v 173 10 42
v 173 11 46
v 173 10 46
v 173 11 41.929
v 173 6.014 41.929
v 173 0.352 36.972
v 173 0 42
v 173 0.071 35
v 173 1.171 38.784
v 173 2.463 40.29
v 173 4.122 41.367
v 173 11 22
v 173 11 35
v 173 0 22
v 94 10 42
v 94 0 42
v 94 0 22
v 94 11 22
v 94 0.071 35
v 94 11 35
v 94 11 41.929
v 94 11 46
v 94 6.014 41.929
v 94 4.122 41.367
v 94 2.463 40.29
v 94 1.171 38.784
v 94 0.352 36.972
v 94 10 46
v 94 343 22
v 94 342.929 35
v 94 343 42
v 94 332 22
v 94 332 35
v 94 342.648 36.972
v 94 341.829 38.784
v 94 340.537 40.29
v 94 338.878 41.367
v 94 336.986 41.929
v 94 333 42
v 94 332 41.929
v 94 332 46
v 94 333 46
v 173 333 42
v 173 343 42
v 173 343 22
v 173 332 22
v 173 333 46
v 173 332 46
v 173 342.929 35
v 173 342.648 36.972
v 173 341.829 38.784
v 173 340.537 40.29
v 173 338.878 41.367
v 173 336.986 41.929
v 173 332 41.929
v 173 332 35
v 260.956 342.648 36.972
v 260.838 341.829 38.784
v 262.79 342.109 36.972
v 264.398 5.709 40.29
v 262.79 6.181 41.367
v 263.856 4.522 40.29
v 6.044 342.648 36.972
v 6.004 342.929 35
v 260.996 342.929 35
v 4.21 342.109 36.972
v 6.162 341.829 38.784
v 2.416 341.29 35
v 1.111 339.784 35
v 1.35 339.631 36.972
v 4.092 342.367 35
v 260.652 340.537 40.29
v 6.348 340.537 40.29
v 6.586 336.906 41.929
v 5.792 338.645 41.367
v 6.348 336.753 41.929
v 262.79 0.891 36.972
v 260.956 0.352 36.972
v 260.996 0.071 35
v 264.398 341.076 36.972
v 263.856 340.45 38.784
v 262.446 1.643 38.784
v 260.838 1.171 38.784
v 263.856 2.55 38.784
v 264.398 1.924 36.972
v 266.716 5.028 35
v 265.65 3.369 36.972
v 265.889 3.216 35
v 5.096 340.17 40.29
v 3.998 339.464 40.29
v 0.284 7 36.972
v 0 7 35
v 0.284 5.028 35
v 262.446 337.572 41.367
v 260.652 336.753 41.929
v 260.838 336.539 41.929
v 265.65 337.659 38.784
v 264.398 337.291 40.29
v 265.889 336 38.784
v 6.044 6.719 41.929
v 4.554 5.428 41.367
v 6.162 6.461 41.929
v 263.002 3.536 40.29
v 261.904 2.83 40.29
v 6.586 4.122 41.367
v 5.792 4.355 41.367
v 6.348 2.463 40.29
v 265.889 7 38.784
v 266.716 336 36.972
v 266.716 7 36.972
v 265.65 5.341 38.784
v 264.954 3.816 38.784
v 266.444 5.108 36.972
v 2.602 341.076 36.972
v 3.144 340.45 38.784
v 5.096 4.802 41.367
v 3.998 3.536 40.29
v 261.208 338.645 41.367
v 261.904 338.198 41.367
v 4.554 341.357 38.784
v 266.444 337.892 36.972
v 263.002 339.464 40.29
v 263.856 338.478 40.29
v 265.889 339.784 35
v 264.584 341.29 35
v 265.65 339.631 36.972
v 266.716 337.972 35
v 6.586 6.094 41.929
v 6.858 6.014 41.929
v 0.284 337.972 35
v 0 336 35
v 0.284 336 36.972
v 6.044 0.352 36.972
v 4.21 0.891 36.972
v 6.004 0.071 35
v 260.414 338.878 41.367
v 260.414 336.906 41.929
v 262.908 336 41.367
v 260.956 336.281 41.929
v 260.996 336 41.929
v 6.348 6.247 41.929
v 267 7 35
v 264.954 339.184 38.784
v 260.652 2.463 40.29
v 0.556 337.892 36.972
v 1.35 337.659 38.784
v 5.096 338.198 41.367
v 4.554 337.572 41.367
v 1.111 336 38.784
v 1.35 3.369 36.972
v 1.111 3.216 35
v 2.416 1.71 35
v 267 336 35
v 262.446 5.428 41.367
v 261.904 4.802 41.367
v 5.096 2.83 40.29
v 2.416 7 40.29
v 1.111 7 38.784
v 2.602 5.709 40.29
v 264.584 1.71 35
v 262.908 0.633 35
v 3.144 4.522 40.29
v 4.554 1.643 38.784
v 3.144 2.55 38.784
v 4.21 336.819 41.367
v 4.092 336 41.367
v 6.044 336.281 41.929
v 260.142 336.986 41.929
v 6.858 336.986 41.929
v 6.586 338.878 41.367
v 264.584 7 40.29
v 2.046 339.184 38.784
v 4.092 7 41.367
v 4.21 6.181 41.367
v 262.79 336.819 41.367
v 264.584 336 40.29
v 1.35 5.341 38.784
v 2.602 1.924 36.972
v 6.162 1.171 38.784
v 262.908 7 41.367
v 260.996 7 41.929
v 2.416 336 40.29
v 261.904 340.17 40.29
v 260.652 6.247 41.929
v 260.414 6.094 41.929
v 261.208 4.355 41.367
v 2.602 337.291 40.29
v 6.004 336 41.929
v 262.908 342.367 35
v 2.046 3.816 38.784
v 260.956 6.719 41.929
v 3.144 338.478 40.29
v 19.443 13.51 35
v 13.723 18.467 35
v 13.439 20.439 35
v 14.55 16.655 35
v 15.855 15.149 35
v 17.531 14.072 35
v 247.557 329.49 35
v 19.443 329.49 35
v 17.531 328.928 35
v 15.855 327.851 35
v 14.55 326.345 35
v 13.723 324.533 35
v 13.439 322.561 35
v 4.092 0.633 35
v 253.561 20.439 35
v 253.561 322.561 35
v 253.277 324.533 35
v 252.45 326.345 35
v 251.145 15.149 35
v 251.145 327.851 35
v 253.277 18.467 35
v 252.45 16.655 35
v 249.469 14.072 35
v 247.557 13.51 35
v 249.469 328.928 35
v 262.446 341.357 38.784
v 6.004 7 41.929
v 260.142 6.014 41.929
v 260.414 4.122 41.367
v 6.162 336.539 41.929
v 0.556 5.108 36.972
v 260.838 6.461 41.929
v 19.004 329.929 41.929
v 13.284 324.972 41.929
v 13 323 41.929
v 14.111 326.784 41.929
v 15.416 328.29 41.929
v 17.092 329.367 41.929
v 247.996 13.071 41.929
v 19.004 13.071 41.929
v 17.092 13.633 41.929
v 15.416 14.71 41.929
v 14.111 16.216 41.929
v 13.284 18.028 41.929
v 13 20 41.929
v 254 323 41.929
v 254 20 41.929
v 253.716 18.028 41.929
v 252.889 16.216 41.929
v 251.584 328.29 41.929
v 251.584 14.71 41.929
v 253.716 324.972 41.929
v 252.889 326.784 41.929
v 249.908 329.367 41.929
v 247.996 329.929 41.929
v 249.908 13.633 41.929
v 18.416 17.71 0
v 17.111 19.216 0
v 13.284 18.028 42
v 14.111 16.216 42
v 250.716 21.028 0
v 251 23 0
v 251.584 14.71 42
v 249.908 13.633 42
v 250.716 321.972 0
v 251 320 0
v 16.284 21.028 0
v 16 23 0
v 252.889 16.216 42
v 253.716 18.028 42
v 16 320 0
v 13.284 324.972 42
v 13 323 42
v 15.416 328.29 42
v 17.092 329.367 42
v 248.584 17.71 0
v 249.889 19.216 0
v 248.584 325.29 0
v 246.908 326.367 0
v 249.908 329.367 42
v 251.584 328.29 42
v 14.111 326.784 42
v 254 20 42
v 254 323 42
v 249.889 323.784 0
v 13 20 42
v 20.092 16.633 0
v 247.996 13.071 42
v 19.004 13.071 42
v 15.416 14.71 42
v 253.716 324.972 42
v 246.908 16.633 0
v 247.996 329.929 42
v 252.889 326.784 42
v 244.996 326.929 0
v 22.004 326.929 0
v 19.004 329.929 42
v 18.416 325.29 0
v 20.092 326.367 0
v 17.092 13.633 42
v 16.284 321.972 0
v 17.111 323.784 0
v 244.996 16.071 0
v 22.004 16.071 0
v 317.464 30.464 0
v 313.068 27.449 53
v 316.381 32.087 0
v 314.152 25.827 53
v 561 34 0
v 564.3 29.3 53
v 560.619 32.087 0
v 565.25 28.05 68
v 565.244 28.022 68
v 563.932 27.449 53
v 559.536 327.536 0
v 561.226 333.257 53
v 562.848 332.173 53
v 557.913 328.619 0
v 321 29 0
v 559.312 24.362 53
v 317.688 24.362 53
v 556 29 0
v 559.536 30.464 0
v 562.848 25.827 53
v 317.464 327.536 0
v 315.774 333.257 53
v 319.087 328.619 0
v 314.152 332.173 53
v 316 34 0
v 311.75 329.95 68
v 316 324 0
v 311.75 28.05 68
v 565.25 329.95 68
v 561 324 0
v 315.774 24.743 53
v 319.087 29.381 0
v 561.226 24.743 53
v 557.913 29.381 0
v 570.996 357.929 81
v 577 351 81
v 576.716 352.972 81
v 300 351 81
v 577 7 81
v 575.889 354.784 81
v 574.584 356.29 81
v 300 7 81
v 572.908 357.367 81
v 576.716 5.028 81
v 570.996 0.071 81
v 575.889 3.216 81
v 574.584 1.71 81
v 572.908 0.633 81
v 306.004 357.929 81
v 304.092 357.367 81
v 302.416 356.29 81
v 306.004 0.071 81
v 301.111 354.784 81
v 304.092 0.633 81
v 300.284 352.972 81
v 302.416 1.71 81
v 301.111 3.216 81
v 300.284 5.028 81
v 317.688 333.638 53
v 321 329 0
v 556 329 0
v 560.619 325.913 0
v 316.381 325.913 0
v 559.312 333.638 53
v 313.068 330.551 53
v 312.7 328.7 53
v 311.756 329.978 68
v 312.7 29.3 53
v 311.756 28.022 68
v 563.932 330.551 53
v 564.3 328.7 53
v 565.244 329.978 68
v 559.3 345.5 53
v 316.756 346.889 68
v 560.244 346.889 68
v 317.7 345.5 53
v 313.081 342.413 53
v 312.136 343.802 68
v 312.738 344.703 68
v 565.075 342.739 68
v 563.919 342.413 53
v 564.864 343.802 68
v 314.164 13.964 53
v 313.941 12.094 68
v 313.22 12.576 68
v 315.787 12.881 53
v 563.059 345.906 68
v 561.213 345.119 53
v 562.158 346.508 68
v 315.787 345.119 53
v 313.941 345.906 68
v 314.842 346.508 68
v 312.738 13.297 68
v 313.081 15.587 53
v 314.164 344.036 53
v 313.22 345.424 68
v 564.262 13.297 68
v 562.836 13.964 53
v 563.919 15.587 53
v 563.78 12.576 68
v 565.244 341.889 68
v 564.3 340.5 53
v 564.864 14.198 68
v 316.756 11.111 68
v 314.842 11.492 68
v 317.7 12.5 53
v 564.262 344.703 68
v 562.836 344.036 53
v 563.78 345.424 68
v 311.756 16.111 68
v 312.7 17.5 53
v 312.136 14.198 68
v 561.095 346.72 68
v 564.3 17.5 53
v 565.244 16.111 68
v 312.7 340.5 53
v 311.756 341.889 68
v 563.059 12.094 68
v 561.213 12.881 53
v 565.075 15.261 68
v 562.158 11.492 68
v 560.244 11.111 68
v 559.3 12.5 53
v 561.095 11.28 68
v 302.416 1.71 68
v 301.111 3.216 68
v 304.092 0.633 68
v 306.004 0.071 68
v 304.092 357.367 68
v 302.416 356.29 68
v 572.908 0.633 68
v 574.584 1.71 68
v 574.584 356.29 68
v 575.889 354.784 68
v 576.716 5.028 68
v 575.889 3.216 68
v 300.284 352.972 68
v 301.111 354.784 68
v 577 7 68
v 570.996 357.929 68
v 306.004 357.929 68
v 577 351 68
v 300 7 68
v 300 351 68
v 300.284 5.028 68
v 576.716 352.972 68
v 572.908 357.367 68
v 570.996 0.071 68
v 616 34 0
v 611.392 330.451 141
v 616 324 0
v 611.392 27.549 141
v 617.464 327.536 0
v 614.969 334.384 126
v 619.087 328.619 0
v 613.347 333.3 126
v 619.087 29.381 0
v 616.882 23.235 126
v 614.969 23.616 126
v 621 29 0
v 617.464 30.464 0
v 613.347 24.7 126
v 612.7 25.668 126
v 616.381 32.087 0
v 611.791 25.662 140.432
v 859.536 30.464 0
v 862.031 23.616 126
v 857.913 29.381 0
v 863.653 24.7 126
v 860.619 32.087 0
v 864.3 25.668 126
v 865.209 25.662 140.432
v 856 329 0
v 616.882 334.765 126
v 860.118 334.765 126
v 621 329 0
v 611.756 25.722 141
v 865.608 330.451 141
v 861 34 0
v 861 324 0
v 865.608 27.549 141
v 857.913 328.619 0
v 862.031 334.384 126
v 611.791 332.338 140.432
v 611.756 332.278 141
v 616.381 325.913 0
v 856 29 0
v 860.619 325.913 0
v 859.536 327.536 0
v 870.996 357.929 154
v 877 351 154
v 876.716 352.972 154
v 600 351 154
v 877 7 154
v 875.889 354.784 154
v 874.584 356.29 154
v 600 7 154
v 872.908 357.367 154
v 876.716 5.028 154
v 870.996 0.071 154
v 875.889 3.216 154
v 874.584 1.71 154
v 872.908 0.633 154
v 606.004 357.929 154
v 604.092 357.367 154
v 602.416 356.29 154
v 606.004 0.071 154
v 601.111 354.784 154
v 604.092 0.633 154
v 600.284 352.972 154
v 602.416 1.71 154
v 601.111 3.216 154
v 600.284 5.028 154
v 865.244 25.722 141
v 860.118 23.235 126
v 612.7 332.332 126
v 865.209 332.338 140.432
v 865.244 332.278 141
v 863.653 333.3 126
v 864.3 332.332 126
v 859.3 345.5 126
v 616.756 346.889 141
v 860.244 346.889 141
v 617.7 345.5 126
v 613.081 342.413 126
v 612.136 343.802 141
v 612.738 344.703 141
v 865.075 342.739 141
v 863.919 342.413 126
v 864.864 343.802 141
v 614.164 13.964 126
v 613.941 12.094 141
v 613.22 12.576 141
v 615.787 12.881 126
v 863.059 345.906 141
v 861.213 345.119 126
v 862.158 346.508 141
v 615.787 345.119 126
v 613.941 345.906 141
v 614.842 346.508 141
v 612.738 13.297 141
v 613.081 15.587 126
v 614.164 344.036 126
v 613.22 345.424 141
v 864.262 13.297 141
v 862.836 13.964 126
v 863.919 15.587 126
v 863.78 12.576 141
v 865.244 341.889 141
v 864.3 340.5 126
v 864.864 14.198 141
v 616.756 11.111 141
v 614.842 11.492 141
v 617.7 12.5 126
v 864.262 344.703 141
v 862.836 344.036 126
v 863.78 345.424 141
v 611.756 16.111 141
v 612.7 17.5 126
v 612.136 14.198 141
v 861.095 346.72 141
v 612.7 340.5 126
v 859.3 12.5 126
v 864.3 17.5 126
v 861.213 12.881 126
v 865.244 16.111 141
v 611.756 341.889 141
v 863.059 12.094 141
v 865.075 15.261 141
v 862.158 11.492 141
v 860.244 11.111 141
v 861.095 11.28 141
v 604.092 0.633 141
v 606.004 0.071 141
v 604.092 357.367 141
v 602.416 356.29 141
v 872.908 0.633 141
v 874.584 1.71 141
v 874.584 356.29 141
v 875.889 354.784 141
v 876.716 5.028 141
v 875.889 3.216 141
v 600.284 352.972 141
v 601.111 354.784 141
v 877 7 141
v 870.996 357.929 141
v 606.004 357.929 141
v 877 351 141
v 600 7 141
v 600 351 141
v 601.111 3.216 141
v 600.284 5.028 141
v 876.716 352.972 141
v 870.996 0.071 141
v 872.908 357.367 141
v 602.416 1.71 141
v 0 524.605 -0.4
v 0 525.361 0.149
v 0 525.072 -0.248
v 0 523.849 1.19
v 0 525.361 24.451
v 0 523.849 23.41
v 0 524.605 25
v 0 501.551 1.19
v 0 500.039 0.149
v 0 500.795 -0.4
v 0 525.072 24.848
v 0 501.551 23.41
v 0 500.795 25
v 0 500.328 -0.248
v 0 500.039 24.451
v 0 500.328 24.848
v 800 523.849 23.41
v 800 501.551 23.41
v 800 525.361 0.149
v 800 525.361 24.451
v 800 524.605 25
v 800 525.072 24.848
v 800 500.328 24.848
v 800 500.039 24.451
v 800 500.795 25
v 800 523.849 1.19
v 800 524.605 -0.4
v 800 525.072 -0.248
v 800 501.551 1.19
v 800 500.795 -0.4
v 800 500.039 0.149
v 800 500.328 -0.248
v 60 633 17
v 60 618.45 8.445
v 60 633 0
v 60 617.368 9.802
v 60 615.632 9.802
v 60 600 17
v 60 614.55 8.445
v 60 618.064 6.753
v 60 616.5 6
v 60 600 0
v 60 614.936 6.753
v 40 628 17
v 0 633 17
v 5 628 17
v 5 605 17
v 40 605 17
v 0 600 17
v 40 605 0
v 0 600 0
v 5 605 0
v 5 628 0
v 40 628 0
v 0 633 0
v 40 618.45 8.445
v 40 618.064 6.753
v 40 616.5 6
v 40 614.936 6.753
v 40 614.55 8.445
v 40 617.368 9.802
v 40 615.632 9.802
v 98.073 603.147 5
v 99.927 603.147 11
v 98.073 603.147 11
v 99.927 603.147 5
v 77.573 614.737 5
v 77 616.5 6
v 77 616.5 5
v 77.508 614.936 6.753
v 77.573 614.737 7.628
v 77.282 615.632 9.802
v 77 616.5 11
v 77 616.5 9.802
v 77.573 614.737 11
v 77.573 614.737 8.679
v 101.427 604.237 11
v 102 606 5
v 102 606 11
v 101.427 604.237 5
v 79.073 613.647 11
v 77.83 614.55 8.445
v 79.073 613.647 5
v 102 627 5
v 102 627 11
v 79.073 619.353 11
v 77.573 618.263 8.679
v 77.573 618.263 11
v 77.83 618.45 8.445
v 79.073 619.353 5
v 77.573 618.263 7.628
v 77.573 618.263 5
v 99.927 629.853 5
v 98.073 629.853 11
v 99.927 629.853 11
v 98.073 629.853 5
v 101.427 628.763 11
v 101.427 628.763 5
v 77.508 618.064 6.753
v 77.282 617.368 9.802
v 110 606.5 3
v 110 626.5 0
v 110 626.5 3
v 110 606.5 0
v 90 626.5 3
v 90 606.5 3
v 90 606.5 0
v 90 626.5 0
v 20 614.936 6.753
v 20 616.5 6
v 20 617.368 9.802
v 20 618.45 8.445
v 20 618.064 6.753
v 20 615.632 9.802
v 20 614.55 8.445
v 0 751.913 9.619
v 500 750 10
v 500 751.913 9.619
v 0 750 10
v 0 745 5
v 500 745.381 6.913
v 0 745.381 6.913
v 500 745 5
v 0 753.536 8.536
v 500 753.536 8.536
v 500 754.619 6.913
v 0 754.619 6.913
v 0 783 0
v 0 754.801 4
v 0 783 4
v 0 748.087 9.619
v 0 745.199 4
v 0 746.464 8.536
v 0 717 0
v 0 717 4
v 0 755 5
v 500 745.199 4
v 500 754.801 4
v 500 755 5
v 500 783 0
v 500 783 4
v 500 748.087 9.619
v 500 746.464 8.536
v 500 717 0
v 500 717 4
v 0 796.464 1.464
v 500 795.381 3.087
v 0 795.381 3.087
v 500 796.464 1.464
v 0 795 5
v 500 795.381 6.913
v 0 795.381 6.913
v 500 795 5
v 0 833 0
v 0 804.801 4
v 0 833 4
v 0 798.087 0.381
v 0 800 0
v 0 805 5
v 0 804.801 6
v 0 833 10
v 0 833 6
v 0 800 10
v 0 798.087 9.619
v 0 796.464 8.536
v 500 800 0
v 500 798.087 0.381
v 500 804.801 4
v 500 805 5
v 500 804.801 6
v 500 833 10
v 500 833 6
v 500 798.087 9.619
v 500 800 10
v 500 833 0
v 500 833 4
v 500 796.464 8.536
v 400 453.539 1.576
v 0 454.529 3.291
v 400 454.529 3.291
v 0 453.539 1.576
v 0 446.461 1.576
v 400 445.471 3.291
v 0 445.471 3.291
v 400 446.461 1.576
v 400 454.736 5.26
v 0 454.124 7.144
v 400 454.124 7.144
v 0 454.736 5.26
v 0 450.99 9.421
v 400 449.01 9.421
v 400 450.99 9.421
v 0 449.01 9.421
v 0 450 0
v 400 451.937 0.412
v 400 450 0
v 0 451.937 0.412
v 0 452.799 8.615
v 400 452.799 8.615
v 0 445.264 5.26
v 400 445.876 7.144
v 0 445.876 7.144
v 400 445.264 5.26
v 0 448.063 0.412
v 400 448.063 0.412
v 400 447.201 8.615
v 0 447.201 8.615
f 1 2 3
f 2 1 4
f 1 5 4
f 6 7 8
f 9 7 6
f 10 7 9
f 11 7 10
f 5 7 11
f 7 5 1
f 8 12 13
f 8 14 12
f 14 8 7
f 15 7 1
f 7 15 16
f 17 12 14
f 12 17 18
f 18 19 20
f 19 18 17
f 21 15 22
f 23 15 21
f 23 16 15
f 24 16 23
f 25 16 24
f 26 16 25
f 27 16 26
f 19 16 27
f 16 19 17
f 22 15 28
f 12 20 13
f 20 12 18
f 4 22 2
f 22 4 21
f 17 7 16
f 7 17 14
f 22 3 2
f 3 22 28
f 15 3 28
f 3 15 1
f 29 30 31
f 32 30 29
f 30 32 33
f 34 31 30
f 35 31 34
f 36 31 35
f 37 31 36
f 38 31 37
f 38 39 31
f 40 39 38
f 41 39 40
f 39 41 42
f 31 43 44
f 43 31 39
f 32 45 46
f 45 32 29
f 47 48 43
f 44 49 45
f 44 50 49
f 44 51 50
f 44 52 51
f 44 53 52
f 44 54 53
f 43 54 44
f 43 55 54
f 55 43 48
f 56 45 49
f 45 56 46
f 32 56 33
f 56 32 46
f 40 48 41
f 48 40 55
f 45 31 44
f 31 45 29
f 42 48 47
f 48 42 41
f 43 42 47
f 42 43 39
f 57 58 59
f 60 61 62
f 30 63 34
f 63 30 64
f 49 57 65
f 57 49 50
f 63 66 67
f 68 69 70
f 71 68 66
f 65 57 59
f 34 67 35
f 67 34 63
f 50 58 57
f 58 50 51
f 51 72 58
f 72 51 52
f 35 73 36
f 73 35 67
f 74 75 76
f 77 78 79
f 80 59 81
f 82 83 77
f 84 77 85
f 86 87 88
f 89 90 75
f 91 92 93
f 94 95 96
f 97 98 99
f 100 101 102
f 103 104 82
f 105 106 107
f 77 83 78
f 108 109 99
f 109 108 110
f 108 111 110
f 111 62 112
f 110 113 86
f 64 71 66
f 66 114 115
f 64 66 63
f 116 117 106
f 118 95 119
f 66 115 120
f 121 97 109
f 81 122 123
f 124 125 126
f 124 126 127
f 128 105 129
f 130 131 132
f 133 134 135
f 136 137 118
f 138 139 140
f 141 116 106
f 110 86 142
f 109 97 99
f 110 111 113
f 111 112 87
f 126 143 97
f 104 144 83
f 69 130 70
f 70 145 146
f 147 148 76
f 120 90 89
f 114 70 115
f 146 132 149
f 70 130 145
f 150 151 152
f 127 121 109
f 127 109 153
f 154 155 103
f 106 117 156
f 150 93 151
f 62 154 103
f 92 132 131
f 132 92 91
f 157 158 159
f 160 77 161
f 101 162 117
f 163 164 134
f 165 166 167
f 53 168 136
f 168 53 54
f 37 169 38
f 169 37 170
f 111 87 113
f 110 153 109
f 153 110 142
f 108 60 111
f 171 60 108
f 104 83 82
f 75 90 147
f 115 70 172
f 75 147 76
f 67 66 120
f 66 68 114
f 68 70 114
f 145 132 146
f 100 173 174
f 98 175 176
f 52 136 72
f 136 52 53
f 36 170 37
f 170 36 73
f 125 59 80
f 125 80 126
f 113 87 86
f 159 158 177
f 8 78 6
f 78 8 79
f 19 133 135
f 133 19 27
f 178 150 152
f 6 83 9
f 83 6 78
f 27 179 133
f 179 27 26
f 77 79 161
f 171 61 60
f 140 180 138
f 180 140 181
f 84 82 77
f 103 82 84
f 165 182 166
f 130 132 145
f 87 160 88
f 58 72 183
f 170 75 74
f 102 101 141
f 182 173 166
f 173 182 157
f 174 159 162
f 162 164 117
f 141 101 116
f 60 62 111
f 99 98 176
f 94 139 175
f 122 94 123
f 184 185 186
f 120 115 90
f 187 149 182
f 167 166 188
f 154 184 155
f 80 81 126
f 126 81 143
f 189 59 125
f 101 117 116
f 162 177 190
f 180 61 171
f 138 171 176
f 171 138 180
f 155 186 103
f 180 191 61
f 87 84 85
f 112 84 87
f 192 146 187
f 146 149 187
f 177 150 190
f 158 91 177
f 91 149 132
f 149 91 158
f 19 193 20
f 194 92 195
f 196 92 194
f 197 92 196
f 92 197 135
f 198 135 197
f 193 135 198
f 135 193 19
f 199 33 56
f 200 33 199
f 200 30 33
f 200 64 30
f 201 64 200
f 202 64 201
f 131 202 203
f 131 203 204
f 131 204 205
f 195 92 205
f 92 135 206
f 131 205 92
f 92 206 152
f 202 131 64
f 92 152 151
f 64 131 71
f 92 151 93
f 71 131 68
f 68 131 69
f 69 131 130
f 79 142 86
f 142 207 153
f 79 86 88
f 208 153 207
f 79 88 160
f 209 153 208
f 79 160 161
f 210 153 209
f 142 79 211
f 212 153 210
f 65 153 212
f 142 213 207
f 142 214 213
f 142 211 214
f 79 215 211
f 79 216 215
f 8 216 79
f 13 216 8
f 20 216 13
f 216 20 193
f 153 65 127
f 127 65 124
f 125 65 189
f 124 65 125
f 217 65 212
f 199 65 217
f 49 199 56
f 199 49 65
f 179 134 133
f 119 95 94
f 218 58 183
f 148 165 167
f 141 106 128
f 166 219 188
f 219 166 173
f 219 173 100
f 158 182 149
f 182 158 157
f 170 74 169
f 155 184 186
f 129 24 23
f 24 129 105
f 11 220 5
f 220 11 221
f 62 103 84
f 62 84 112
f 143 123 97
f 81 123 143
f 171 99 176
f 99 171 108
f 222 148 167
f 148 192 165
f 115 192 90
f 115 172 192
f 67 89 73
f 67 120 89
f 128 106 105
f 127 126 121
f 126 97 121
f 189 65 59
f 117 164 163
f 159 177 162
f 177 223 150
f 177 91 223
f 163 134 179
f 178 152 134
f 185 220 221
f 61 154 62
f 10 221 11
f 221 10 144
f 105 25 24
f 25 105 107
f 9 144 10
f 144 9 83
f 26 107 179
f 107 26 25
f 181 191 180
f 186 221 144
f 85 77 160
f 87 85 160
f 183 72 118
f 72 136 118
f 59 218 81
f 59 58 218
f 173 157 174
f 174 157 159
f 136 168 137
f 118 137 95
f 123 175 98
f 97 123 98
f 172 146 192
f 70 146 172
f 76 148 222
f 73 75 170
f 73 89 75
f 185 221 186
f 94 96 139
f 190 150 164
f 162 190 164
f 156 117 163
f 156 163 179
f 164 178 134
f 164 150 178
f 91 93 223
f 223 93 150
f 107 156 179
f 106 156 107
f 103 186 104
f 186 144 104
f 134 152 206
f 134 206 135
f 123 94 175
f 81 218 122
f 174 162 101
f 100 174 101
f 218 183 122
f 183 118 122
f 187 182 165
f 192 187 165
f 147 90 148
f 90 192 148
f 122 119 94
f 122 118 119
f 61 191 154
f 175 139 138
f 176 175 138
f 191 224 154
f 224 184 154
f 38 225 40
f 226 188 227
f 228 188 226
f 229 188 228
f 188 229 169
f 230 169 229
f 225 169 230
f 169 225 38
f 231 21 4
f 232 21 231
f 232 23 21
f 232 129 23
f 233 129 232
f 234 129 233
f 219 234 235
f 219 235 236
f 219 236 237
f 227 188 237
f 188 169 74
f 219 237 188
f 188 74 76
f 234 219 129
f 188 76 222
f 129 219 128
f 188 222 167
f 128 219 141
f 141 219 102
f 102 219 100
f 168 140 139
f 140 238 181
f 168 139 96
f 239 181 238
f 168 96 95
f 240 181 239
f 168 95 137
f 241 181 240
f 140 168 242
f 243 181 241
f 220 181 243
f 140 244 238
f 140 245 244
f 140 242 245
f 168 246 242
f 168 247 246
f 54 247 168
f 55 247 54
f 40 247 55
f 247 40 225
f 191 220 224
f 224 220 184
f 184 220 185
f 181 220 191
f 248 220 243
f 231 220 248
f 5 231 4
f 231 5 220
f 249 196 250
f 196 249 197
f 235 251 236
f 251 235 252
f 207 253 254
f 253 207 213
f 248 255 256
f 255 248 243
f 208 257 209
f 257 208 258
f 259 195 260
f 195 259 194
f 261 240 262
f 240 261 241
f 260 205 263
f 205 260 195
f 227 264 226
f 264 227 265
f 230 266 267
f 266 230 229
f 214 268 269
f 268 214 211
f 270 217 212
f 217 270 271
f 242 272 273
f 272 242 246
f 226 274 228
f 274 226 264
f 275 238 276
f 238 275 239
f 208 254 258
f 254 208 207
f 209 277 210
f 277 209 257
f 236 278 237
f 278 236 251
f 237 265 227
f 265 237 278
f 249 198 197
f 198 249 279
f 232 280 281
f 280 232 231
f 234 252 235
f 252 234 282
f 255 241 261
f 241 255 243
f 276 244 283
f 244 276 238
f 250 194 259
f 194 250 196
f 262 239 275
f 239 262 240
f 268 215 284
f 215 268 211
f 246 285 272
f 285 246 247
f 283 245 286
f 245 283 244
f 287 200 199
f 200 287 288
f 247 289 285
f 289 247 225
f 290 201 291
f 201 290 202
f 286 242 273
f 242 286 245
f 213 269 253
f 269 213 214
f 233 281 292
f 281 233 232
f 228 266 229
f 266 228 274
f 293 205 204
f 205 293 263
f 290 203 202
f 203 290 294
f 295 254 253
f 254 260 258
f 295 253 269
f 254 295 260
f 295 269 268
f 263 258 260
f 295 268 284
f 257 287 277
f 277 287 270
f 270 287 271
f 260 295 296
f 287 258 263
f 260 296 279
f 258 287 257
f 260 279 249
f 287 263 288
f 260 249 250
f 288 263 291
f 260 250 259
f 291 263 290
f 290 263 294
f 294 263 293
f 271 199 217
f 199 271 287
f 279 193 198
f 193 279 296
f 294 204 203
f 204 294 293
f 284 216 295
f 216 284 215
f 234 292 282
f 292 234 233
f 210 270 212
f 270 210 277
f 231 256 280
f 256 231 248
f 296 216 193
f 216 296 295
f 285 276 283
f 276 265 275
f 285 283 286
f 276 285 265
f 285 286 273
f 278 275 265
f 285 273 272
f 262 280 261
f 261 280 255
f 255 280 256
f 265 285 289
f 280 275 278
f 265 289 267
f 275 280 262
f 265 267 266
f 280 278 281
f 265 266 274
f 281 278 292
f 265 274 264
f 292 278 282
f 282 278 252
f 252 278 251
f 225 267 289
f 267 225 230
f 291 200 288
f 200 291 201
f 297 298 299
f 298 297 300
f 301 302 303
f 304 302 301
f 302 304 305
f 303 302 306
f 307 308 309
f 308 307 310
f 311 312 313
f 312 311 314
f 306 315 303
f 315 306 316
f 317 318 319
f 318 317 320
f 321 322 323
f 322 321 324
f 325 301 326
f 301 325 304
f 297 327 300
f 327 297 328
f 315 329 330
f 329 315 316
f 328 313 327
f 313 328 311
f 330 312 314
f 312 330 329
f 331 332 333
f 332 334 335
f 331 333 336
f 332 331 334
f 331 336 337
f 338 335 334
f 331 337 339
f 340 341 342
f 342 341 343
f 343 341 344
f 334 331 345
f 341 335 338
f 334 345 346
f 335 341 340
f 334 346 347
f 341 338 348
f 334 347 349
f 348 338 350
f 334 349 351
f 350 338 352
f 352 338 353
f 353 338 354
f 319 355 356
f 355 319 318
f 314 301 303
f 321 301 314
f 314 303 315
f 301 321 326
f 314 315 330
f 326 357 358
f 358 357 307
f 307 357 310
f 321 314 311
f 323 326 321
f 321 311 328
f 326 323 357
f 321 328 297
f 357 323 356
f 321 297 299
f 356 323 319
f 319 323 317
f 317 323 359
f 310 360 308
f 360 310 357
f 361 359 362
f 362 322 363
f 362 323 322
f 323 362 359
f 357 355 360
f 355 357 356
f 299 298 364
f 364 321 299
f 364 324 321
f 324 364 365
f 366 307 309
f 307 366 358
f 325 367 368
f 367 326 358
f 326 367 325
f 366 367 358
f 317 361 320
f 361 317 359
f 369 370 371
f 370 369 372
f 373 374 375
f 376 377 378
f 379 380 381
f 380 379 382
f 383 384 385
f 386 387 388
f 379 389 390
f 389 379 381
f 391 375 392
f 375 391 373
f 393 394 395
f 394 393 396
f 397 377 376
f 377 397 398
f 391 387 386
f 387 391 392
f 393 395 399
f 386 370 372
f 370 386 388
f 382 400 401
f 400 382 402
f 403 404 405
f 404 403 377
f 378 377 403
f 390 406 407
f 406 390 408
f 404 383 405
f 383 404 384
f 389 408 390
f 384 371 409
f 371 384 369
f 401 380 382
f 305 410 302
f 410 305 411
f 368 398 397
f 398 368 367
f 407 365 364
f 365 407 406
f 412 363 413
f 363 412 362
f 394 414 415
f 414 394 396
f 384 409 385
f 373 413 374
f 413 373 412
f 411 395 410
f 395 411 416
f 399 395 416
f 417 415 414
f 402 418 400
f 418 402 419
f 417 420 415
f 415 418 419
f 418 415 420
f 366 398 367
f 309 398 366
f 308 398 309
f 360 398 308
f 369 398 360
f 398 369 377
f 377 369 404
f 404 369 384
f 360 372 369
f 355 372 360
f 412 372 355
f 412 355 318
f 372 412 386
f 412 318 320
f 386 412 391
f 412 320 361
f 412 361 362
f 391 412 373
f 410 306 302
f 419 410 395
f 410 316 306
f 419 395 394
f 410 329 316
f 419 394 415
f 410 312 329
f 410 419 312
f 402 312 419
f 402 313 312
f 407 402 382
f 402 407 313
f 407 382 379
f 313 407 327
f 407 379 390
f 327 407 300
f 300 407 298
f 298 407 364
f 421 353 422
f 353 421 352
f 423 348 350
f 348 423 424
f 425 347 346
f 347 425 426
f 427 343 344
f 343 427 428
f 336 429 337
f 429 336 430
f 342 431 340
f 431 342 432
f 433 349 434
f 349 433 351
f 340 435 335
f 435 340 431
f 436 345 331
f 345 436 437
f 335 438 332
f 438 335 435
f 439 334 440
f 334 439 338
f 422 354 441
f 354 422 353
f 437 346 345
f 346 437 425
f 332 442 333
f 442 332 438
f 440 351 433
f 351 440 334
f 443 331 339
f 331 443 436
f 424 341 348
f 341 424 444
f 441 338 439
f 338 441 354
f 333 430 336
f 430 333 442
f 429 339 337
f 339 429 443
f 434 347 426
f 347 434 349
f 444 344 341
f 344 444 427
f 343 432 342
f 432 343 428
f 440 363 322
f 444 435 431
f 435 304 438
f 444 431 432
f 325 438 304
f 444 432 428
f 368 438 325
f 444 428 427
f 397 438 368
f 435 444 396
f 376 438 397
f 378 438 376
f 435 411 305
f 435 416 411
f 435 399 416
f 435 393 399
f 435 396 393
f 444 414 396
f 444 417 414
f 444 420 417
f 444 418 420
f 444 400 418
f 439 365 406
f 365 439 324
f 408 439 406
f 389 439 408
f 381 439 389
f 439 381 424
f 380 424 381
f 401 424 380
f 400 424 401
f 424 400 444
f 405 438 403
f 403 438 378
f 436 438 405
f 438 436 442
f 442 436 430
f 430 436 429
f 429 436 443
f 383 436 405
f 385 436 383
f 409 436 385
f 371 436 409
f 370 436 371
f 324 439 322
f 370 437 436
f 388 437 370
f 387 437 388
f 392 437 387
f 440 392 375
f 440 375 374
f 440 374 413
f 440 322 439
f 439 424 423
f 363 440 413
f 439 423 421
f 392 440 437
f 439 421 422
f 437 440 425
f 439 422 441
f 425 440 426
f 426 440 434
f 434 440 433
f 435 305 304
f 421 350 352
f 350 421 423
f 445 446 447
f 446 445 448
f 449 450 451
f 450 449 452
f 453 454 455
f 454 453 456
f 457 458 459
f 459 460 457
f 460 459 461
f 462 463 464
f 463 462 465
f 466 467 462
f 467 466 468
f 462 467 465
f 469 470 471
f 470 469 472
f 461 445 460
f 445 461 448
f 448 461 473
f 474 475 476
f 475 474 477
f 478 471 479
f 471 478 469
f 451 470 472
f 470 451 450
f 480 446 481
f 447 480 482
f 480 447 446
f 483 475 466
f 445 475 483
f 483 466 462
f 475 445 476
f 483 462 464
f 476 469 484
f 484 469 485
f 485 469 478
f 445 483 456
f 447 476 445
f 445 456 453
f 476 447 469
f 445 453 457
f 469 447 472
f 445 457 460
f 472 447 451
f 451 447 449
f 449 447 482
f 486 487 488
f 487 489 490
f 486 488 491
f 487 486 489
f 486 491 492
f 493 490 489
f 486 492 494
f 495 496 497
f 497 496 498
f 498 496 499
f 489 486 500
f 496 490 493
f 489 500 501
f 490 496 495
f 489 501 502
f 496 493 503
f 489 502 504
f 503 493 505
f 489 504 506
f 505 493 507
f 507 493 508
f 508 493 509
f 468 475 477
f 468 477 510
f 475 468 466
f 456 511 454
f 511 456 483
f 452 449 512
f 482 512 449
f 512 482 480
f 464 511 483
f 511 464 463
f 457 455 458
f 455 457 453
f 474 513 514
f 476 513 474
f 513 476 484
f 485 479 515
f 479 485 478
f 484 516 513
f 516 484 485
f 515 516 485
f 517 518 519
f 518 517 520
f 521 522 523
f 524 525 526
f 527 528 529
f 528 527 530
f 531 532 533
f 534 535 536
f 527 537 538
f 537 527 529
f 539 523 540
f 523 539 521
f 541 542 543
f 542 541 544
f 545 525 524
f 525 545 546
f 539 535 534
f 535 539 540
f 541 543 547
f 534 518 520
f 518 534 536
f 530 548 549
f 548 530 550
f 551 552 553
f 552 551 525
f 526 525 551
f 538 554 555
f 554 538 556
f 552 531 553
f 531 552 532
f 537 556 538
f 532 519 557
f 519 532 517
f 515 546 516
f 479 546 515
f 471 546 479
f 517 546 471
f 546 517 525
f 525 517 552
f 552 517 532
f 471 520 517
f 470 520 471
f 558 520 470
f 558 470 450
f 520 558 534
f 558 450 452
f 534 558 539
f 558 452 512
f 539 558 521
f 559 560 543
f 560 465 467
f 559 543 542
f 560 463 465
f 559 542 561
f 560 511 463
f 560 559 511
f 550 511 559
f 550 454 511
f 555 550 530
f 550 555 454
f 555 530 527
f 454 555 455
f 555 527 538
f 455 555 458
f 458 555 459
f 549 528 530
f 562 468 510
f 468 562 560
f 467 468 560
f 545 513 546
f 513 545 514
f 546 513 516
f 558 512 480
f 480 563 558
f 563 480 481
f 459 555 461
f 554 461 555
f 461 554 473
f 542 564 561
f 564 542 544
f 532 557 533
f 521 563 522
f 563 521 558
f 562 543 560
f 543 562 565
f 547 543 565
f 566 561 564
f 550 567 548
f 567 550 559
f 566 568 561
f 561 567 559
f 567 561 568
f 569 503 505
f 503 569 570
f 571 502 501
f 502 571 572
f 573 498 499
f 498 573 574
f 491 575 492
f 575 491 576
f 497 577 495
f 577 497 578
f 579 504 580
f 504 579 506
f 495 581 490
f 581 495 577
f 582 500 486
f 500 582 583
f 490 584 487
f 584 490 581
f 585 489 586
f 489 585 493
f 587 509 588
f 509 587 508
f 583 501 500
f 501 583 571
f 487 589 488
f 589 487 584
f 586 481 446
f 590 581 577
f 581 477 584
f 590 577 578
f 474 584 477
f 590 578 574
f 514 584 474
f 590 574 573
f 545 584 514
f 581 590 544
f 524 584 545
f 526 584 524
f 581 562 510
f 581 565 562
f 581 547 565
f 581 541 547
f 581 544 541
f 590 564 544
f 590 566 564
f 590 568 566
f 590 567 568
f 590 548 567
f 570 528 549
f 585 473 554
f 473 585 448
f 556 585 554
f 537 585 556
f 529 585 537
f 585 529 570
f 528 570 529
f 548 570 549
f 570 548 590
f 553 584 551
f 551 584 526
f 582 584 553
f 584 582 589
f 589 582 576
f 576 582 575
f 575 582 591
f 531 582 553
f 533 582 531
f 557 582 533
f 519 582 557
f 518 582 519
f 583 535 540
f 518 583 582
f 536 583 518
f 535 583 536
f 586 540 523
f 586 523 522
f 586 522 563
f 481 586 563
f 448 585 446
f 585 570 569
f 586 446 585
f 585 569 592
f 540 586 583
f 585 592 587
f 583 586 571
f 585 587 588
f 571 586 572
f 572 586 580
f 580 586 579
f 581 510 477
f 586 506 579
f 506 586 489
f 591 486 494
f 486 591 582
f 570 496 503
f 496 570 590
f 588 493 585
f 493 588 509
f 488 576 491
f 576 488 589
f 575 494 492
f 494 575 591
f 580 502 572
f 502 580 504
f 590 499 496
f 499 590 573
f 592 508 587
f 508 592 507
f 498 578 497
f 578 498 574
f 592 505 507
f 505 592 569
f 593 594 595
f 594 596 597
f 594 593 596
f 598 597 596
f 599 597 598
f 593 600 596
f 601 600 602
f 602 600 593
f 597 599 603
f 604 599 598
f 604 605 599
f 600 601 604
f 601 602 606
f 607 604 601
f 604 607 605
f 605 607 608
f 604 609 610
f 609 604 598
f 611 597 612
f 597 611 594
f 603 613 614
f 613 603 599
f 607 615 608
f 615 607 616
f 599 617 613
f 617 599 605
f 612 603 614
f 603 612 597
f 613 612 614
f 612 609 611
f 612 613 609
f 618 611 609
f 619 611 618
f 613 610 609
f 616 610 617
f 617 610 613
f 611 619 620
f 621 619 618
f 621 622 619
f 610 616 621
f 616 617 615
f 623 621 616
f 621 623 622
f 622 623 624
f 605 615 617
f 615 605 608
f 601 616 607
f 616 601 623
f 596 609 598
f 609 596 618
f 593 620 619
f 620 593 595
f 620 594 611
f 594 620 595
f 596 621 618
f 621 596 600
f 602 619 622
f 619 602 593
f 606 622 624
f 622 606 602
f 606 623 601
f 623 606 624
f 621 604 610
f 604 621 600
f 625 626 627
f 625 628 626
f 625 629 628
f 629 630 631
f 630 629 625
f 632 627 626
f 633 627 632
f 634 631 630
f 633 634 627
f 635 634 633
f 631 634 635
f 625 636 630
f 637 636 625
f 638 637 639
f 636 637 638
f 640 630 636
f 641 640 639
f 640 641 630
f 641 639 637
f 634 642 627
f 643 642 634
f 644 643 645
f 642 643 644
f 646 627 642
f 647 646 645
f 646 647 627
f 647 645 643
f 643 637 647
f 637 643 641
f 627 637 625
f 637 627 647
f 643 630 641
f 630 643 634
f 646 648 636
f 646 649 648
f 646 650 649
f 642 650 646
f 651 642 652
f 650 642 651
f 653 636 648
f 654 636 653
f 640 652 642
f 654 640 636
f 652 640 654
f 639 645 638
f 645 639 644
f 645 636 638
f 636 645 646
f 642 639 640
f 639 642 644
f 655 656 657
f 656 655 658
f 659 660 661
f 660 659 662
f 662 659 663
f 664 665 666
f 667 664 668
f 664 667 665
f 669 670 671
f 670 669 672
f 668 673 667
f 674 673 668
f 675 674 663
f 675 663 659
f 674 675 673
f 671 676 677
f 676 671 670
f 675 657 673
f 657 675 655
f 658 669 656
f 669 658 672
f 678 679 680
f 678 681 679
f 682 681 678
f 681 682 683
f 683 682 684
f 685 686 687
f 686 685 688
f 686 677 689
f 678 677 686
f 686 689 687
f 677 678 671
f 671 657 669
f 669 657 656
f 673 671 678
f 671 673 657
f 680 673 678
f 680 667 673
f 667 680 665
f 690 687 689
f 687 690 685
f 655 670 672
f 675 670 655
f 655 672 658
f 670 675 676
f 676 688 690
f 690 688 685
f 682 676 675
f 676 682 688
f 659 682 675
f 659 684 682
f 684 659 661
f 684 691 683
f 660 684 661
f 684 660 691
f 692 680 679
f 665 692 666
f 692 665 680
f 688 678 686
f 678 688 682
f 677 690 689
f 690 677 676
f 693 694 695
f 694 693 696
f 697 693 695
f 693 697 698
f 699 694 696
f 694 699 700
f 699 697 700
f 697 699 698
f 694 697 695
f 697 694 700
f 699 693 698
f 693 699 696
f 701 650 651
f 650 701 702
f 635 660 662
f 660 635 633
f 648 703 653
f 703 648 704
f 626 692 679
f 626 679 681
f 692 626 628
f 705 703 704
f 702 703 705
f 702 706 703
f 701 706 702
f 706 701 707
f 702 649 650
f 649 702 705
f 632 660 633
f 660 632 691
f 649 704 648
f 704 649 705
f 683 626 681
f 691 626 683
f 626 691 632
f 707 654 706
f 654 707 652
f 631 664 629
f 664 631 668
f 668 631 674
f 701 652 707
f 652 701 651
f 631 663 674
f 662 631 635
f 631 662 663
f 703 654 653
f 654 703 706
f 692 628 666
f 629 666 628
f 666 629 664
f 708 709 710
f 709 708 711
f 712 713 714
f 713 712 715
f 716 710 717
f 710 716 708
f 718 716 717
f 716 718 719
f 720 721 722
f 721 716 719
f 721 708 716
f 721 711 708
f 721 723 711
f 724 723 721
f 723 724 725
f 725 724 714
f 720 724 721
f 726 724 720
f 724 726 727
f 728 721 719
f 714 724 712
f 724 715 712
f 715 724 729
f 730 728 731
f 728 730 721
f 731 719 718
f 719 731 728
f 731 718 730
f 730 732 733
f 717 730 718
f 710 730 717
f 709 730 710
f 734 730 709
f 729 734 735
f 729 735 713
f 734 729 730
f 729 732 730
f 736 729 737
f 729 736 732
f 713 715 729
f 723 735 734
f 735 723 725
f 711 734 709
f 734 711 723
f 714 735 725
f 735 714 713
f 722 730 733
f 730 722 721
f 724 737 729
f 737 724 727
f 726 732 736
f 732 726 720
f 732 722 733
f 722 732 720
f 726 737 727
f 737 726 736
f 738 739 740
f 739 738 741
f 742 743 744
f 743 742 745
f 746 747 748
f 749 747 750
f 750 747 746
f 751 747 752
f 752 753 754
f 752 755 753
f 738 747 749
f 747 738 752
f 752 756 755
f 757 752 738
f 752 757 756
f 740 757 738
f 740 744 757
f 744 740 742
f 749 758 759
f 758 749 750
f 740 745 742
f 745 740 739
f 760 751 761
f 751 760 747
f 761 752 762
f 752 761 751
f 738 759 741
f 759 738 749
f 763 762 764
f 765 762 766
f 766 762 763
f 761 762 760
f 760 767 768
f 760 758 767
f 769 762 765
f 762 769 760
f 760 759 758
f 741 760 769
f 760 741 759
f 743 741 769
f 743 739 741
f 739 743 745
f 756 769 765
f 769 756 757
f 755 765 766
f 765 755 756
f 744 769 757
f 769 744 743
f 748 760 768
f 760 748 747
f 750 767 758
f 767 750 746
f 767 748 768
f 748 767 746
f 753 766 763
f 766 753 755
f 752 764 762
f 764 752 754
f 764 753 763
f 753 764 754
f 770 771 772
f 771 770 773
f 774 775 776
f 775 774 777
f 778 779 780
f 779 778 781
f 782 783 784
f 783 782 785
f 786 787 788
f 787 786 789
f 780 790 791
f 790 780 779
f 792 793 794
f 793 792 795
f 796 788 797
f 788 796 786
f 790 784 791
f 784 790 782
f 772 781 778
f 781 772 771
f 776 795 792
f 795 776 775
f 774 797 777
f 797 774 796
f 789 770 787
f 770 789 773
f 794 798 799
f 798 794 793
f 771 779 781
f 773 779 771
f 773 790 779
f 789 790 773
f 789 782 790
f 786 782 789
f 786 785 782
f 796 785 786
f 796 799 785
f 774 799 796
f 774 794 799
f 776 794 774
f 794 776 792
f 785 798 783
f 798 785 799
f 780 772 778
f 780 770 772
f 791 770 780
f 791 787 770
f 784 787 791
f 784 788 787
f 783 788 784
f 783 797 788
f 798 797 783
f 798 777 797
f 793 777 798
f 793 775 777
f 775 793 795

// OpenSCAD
parts_bin();

translate([300, 0])
project_bin();

translate([600, 0])
tall_project_bin();

translate([0, 500, 25])
rotate([0, 90])
1in_16ga_square_tube(800);

translate([0, 600])
toggle_latch();

translate([0, 750])
piano_hinge(500);

translate([0, 800])
piano_hinge(500, false);

translate([0, 450, in_to_mm(3/16)])
rotate([0, 90])
3_8_metal_rod(400);

module parts_bin() {
    depth = 343;
    width = 267;
    height = 42;

    //%bounding_box();

    lid();
    container();
    clasps();

    module bounding_box() {
        cube([width, depth, height]);
    }

    module lid() {
        corner_radius = 7;
        lid_height = 7;

        hull() {
            for (x = [corner_radius, width-corner_radius], y = [corner_radius, depth-corner_radius]) {
                translate([x, y, height-lid_height])
                rounded_corner();
            }
        }

        module rounded_corner() {
            difference() {
                sphere(r = corner_radius);
                translate([-corner_radius, -corner_radius, -corner_radius])
                cube([corner_radius*2, corner_radius*2, corner_radius]);
            }
        }
    }

    module container() {
        corner_radius = 7;

        hull() {
            for (x = [corner_radius+16, width-corner_radius-16], y = [corner_radius+16, depth-corner_radius-16]) {
                translate([x, y])
                rounded_corner();
            }

            for (x = [corner_radius+13, width-corner_radius-13], y = [corner_radius+13, depth-corner_radius-13]) {
                translate([x, y, height-1])
                rounded_corner();
            }
        }

        module rounded_corner() {
            cylinder(h = 1, r = corner_radius);
        }
    }

    module clasps() {
        clasp_length = 79;
        clasp_height = 20;

        translate([width/2 - clasp_length/2, 0, height - clasp_height])
        clasp();

        translate([width/2 + clasp_length/2, depth, height - clasp_height])
        rotate([0, 0, 180])
        clasp();

        module clasp() {
            cube([clasp_length, 11, clasp_height]);
            translate([0, 10, clasp_height])
            cube([clasp_length, 1, 4]);
        }
    }
}

module project_bin(height = 81) {
    depth = 358;
    width = 277;

    //%bounding_box();

    lid();
    container();

    module bounding_box() {
        cube([width, depth, height]);
    }

    module lid() {
        corner_radius = 7;
        lid_height = 13;

        translate([0, 0, height - lid_height])
        hull() {
            for (x = [corner_radius, width-corner_radius], y = [corner_radius, depth-corner_radius]) {
                translate([x, y])
                rounded_corner();
            }
        }

        module rounded_corner() {
            cylinder(h = lid_height, r = corner_radius);
        }
    }

    module container() {
        corner_radius = 5;

        hull() {
            for (x = [corner_radius+16, width-corner_radius-16], y = [corner_radius+29, depth-corner_radius-29]) {
                translate([x, y])
                rounded_corner();
            }

            for (x = [corner_radius+11, width-corner_radius-11], y = [corner_radius+22, depth-corner_radius-22]) {
                translate([x, y, height-1])
                rounded_corner();
            }
        }

        hull() {
            for (x = [corner_radius+12.7, width-corner_radius-12.7], y = [corner_radius+12.5, depth-corner_radius-12.5]) {
                translate([x, y, height-28])
                rounded_corner();
            }

            for (x = [corner_radius+11, width-corner_radius-11], y = [corner_radius+10, depth-corner_radius-10]) {
                translate([x, y, height-1])
                rounded_corner();
            }
        }

        module rounded_corner() {
            cylinder(h = 1, r = corner_radius);
        }
    }
}

module tall_project_bin() { project_bin(height = 154); }

module square_tube(length, width, wall_thickness) {
    $fn = 10;
    wall_thickness = 1.59; // 16 gauge

    pos = [
        [wall_thickness/2, wall_thickness/2],
        [wall_thickness/2, width-wall_thickness/2],
        [width-wall_thickness/2, width-wall_thickness/2],
        [width-wall_thickness/2, wall_thickness/2],
    ];

    for (i = [0 : 3]) {
        hull() {
            translate(pos[i])
            rounded_corner();
            translate(pos[(i+1)%4])
            rounded_corner();
        }
    }

    module rounded_corner() {
        cylinder(h = length, d = wall_thickness);
    }
}

module 1in_16ga_square_tube(length) {
    echo(str("1in 16ga square tube: ", length));
    square_tube(
        length = length,
        width = in_to_mm(1),
        wall_thickness = 1.59
    );
}

module toggle_latch() {
    echo("toggle latch");
    difference() {
        cube([60, 33, 17]);

        translate([5, 5, -1])
        cube([35, 23, 20]);
    }

    hull() {
        translate([99, 6, 5])
        cylinder(d = 6, h = 6);

        translate([99, 27, 5])
        cylinder(d = 6, h = 6);

        translate([80, 21/2+6, 5])
        cylinder(d = 6, h = 6);
    }

    translate([90, 6.5])
    cube([20, 20, 3]);

    translate([20, 33/2, 8])
    rotate([0, 90])
    cylinder(d = 4, h = 60);
}

module piano_hinge(length, open = true) {
    hinge_dia = 10;
    hinge_size = 33;
    hinge_thickness = hinge_dia/2-1;

    echo(str("piano hinge: ", length));

    translate([0, 0, 5])
    rotate([0, 90])
    cylinder(d = hinge_dia, h = length);

    cube([length, hinge_size, hinge_dia/2-1]);

    if (open) {
        translate([0, -hinge_size])
        cube([length, hinge_size, hinge_thickness]);
    } else {
        translate([0, 0, hinge_dia-hinge_thickness])
        cube([length, hinge_size, hinge_thickness]);
    }
}

module metal_rod(length, diameter) {
    cylinder(h = length, d = diameter);
}

module 3_8_metal_rod(length) {
    echo(str("3/8 rod: ", length));
    metal_rod(length, in_to_mm(3/8));
}

function in_to_mm(in) = in * 25.4;
